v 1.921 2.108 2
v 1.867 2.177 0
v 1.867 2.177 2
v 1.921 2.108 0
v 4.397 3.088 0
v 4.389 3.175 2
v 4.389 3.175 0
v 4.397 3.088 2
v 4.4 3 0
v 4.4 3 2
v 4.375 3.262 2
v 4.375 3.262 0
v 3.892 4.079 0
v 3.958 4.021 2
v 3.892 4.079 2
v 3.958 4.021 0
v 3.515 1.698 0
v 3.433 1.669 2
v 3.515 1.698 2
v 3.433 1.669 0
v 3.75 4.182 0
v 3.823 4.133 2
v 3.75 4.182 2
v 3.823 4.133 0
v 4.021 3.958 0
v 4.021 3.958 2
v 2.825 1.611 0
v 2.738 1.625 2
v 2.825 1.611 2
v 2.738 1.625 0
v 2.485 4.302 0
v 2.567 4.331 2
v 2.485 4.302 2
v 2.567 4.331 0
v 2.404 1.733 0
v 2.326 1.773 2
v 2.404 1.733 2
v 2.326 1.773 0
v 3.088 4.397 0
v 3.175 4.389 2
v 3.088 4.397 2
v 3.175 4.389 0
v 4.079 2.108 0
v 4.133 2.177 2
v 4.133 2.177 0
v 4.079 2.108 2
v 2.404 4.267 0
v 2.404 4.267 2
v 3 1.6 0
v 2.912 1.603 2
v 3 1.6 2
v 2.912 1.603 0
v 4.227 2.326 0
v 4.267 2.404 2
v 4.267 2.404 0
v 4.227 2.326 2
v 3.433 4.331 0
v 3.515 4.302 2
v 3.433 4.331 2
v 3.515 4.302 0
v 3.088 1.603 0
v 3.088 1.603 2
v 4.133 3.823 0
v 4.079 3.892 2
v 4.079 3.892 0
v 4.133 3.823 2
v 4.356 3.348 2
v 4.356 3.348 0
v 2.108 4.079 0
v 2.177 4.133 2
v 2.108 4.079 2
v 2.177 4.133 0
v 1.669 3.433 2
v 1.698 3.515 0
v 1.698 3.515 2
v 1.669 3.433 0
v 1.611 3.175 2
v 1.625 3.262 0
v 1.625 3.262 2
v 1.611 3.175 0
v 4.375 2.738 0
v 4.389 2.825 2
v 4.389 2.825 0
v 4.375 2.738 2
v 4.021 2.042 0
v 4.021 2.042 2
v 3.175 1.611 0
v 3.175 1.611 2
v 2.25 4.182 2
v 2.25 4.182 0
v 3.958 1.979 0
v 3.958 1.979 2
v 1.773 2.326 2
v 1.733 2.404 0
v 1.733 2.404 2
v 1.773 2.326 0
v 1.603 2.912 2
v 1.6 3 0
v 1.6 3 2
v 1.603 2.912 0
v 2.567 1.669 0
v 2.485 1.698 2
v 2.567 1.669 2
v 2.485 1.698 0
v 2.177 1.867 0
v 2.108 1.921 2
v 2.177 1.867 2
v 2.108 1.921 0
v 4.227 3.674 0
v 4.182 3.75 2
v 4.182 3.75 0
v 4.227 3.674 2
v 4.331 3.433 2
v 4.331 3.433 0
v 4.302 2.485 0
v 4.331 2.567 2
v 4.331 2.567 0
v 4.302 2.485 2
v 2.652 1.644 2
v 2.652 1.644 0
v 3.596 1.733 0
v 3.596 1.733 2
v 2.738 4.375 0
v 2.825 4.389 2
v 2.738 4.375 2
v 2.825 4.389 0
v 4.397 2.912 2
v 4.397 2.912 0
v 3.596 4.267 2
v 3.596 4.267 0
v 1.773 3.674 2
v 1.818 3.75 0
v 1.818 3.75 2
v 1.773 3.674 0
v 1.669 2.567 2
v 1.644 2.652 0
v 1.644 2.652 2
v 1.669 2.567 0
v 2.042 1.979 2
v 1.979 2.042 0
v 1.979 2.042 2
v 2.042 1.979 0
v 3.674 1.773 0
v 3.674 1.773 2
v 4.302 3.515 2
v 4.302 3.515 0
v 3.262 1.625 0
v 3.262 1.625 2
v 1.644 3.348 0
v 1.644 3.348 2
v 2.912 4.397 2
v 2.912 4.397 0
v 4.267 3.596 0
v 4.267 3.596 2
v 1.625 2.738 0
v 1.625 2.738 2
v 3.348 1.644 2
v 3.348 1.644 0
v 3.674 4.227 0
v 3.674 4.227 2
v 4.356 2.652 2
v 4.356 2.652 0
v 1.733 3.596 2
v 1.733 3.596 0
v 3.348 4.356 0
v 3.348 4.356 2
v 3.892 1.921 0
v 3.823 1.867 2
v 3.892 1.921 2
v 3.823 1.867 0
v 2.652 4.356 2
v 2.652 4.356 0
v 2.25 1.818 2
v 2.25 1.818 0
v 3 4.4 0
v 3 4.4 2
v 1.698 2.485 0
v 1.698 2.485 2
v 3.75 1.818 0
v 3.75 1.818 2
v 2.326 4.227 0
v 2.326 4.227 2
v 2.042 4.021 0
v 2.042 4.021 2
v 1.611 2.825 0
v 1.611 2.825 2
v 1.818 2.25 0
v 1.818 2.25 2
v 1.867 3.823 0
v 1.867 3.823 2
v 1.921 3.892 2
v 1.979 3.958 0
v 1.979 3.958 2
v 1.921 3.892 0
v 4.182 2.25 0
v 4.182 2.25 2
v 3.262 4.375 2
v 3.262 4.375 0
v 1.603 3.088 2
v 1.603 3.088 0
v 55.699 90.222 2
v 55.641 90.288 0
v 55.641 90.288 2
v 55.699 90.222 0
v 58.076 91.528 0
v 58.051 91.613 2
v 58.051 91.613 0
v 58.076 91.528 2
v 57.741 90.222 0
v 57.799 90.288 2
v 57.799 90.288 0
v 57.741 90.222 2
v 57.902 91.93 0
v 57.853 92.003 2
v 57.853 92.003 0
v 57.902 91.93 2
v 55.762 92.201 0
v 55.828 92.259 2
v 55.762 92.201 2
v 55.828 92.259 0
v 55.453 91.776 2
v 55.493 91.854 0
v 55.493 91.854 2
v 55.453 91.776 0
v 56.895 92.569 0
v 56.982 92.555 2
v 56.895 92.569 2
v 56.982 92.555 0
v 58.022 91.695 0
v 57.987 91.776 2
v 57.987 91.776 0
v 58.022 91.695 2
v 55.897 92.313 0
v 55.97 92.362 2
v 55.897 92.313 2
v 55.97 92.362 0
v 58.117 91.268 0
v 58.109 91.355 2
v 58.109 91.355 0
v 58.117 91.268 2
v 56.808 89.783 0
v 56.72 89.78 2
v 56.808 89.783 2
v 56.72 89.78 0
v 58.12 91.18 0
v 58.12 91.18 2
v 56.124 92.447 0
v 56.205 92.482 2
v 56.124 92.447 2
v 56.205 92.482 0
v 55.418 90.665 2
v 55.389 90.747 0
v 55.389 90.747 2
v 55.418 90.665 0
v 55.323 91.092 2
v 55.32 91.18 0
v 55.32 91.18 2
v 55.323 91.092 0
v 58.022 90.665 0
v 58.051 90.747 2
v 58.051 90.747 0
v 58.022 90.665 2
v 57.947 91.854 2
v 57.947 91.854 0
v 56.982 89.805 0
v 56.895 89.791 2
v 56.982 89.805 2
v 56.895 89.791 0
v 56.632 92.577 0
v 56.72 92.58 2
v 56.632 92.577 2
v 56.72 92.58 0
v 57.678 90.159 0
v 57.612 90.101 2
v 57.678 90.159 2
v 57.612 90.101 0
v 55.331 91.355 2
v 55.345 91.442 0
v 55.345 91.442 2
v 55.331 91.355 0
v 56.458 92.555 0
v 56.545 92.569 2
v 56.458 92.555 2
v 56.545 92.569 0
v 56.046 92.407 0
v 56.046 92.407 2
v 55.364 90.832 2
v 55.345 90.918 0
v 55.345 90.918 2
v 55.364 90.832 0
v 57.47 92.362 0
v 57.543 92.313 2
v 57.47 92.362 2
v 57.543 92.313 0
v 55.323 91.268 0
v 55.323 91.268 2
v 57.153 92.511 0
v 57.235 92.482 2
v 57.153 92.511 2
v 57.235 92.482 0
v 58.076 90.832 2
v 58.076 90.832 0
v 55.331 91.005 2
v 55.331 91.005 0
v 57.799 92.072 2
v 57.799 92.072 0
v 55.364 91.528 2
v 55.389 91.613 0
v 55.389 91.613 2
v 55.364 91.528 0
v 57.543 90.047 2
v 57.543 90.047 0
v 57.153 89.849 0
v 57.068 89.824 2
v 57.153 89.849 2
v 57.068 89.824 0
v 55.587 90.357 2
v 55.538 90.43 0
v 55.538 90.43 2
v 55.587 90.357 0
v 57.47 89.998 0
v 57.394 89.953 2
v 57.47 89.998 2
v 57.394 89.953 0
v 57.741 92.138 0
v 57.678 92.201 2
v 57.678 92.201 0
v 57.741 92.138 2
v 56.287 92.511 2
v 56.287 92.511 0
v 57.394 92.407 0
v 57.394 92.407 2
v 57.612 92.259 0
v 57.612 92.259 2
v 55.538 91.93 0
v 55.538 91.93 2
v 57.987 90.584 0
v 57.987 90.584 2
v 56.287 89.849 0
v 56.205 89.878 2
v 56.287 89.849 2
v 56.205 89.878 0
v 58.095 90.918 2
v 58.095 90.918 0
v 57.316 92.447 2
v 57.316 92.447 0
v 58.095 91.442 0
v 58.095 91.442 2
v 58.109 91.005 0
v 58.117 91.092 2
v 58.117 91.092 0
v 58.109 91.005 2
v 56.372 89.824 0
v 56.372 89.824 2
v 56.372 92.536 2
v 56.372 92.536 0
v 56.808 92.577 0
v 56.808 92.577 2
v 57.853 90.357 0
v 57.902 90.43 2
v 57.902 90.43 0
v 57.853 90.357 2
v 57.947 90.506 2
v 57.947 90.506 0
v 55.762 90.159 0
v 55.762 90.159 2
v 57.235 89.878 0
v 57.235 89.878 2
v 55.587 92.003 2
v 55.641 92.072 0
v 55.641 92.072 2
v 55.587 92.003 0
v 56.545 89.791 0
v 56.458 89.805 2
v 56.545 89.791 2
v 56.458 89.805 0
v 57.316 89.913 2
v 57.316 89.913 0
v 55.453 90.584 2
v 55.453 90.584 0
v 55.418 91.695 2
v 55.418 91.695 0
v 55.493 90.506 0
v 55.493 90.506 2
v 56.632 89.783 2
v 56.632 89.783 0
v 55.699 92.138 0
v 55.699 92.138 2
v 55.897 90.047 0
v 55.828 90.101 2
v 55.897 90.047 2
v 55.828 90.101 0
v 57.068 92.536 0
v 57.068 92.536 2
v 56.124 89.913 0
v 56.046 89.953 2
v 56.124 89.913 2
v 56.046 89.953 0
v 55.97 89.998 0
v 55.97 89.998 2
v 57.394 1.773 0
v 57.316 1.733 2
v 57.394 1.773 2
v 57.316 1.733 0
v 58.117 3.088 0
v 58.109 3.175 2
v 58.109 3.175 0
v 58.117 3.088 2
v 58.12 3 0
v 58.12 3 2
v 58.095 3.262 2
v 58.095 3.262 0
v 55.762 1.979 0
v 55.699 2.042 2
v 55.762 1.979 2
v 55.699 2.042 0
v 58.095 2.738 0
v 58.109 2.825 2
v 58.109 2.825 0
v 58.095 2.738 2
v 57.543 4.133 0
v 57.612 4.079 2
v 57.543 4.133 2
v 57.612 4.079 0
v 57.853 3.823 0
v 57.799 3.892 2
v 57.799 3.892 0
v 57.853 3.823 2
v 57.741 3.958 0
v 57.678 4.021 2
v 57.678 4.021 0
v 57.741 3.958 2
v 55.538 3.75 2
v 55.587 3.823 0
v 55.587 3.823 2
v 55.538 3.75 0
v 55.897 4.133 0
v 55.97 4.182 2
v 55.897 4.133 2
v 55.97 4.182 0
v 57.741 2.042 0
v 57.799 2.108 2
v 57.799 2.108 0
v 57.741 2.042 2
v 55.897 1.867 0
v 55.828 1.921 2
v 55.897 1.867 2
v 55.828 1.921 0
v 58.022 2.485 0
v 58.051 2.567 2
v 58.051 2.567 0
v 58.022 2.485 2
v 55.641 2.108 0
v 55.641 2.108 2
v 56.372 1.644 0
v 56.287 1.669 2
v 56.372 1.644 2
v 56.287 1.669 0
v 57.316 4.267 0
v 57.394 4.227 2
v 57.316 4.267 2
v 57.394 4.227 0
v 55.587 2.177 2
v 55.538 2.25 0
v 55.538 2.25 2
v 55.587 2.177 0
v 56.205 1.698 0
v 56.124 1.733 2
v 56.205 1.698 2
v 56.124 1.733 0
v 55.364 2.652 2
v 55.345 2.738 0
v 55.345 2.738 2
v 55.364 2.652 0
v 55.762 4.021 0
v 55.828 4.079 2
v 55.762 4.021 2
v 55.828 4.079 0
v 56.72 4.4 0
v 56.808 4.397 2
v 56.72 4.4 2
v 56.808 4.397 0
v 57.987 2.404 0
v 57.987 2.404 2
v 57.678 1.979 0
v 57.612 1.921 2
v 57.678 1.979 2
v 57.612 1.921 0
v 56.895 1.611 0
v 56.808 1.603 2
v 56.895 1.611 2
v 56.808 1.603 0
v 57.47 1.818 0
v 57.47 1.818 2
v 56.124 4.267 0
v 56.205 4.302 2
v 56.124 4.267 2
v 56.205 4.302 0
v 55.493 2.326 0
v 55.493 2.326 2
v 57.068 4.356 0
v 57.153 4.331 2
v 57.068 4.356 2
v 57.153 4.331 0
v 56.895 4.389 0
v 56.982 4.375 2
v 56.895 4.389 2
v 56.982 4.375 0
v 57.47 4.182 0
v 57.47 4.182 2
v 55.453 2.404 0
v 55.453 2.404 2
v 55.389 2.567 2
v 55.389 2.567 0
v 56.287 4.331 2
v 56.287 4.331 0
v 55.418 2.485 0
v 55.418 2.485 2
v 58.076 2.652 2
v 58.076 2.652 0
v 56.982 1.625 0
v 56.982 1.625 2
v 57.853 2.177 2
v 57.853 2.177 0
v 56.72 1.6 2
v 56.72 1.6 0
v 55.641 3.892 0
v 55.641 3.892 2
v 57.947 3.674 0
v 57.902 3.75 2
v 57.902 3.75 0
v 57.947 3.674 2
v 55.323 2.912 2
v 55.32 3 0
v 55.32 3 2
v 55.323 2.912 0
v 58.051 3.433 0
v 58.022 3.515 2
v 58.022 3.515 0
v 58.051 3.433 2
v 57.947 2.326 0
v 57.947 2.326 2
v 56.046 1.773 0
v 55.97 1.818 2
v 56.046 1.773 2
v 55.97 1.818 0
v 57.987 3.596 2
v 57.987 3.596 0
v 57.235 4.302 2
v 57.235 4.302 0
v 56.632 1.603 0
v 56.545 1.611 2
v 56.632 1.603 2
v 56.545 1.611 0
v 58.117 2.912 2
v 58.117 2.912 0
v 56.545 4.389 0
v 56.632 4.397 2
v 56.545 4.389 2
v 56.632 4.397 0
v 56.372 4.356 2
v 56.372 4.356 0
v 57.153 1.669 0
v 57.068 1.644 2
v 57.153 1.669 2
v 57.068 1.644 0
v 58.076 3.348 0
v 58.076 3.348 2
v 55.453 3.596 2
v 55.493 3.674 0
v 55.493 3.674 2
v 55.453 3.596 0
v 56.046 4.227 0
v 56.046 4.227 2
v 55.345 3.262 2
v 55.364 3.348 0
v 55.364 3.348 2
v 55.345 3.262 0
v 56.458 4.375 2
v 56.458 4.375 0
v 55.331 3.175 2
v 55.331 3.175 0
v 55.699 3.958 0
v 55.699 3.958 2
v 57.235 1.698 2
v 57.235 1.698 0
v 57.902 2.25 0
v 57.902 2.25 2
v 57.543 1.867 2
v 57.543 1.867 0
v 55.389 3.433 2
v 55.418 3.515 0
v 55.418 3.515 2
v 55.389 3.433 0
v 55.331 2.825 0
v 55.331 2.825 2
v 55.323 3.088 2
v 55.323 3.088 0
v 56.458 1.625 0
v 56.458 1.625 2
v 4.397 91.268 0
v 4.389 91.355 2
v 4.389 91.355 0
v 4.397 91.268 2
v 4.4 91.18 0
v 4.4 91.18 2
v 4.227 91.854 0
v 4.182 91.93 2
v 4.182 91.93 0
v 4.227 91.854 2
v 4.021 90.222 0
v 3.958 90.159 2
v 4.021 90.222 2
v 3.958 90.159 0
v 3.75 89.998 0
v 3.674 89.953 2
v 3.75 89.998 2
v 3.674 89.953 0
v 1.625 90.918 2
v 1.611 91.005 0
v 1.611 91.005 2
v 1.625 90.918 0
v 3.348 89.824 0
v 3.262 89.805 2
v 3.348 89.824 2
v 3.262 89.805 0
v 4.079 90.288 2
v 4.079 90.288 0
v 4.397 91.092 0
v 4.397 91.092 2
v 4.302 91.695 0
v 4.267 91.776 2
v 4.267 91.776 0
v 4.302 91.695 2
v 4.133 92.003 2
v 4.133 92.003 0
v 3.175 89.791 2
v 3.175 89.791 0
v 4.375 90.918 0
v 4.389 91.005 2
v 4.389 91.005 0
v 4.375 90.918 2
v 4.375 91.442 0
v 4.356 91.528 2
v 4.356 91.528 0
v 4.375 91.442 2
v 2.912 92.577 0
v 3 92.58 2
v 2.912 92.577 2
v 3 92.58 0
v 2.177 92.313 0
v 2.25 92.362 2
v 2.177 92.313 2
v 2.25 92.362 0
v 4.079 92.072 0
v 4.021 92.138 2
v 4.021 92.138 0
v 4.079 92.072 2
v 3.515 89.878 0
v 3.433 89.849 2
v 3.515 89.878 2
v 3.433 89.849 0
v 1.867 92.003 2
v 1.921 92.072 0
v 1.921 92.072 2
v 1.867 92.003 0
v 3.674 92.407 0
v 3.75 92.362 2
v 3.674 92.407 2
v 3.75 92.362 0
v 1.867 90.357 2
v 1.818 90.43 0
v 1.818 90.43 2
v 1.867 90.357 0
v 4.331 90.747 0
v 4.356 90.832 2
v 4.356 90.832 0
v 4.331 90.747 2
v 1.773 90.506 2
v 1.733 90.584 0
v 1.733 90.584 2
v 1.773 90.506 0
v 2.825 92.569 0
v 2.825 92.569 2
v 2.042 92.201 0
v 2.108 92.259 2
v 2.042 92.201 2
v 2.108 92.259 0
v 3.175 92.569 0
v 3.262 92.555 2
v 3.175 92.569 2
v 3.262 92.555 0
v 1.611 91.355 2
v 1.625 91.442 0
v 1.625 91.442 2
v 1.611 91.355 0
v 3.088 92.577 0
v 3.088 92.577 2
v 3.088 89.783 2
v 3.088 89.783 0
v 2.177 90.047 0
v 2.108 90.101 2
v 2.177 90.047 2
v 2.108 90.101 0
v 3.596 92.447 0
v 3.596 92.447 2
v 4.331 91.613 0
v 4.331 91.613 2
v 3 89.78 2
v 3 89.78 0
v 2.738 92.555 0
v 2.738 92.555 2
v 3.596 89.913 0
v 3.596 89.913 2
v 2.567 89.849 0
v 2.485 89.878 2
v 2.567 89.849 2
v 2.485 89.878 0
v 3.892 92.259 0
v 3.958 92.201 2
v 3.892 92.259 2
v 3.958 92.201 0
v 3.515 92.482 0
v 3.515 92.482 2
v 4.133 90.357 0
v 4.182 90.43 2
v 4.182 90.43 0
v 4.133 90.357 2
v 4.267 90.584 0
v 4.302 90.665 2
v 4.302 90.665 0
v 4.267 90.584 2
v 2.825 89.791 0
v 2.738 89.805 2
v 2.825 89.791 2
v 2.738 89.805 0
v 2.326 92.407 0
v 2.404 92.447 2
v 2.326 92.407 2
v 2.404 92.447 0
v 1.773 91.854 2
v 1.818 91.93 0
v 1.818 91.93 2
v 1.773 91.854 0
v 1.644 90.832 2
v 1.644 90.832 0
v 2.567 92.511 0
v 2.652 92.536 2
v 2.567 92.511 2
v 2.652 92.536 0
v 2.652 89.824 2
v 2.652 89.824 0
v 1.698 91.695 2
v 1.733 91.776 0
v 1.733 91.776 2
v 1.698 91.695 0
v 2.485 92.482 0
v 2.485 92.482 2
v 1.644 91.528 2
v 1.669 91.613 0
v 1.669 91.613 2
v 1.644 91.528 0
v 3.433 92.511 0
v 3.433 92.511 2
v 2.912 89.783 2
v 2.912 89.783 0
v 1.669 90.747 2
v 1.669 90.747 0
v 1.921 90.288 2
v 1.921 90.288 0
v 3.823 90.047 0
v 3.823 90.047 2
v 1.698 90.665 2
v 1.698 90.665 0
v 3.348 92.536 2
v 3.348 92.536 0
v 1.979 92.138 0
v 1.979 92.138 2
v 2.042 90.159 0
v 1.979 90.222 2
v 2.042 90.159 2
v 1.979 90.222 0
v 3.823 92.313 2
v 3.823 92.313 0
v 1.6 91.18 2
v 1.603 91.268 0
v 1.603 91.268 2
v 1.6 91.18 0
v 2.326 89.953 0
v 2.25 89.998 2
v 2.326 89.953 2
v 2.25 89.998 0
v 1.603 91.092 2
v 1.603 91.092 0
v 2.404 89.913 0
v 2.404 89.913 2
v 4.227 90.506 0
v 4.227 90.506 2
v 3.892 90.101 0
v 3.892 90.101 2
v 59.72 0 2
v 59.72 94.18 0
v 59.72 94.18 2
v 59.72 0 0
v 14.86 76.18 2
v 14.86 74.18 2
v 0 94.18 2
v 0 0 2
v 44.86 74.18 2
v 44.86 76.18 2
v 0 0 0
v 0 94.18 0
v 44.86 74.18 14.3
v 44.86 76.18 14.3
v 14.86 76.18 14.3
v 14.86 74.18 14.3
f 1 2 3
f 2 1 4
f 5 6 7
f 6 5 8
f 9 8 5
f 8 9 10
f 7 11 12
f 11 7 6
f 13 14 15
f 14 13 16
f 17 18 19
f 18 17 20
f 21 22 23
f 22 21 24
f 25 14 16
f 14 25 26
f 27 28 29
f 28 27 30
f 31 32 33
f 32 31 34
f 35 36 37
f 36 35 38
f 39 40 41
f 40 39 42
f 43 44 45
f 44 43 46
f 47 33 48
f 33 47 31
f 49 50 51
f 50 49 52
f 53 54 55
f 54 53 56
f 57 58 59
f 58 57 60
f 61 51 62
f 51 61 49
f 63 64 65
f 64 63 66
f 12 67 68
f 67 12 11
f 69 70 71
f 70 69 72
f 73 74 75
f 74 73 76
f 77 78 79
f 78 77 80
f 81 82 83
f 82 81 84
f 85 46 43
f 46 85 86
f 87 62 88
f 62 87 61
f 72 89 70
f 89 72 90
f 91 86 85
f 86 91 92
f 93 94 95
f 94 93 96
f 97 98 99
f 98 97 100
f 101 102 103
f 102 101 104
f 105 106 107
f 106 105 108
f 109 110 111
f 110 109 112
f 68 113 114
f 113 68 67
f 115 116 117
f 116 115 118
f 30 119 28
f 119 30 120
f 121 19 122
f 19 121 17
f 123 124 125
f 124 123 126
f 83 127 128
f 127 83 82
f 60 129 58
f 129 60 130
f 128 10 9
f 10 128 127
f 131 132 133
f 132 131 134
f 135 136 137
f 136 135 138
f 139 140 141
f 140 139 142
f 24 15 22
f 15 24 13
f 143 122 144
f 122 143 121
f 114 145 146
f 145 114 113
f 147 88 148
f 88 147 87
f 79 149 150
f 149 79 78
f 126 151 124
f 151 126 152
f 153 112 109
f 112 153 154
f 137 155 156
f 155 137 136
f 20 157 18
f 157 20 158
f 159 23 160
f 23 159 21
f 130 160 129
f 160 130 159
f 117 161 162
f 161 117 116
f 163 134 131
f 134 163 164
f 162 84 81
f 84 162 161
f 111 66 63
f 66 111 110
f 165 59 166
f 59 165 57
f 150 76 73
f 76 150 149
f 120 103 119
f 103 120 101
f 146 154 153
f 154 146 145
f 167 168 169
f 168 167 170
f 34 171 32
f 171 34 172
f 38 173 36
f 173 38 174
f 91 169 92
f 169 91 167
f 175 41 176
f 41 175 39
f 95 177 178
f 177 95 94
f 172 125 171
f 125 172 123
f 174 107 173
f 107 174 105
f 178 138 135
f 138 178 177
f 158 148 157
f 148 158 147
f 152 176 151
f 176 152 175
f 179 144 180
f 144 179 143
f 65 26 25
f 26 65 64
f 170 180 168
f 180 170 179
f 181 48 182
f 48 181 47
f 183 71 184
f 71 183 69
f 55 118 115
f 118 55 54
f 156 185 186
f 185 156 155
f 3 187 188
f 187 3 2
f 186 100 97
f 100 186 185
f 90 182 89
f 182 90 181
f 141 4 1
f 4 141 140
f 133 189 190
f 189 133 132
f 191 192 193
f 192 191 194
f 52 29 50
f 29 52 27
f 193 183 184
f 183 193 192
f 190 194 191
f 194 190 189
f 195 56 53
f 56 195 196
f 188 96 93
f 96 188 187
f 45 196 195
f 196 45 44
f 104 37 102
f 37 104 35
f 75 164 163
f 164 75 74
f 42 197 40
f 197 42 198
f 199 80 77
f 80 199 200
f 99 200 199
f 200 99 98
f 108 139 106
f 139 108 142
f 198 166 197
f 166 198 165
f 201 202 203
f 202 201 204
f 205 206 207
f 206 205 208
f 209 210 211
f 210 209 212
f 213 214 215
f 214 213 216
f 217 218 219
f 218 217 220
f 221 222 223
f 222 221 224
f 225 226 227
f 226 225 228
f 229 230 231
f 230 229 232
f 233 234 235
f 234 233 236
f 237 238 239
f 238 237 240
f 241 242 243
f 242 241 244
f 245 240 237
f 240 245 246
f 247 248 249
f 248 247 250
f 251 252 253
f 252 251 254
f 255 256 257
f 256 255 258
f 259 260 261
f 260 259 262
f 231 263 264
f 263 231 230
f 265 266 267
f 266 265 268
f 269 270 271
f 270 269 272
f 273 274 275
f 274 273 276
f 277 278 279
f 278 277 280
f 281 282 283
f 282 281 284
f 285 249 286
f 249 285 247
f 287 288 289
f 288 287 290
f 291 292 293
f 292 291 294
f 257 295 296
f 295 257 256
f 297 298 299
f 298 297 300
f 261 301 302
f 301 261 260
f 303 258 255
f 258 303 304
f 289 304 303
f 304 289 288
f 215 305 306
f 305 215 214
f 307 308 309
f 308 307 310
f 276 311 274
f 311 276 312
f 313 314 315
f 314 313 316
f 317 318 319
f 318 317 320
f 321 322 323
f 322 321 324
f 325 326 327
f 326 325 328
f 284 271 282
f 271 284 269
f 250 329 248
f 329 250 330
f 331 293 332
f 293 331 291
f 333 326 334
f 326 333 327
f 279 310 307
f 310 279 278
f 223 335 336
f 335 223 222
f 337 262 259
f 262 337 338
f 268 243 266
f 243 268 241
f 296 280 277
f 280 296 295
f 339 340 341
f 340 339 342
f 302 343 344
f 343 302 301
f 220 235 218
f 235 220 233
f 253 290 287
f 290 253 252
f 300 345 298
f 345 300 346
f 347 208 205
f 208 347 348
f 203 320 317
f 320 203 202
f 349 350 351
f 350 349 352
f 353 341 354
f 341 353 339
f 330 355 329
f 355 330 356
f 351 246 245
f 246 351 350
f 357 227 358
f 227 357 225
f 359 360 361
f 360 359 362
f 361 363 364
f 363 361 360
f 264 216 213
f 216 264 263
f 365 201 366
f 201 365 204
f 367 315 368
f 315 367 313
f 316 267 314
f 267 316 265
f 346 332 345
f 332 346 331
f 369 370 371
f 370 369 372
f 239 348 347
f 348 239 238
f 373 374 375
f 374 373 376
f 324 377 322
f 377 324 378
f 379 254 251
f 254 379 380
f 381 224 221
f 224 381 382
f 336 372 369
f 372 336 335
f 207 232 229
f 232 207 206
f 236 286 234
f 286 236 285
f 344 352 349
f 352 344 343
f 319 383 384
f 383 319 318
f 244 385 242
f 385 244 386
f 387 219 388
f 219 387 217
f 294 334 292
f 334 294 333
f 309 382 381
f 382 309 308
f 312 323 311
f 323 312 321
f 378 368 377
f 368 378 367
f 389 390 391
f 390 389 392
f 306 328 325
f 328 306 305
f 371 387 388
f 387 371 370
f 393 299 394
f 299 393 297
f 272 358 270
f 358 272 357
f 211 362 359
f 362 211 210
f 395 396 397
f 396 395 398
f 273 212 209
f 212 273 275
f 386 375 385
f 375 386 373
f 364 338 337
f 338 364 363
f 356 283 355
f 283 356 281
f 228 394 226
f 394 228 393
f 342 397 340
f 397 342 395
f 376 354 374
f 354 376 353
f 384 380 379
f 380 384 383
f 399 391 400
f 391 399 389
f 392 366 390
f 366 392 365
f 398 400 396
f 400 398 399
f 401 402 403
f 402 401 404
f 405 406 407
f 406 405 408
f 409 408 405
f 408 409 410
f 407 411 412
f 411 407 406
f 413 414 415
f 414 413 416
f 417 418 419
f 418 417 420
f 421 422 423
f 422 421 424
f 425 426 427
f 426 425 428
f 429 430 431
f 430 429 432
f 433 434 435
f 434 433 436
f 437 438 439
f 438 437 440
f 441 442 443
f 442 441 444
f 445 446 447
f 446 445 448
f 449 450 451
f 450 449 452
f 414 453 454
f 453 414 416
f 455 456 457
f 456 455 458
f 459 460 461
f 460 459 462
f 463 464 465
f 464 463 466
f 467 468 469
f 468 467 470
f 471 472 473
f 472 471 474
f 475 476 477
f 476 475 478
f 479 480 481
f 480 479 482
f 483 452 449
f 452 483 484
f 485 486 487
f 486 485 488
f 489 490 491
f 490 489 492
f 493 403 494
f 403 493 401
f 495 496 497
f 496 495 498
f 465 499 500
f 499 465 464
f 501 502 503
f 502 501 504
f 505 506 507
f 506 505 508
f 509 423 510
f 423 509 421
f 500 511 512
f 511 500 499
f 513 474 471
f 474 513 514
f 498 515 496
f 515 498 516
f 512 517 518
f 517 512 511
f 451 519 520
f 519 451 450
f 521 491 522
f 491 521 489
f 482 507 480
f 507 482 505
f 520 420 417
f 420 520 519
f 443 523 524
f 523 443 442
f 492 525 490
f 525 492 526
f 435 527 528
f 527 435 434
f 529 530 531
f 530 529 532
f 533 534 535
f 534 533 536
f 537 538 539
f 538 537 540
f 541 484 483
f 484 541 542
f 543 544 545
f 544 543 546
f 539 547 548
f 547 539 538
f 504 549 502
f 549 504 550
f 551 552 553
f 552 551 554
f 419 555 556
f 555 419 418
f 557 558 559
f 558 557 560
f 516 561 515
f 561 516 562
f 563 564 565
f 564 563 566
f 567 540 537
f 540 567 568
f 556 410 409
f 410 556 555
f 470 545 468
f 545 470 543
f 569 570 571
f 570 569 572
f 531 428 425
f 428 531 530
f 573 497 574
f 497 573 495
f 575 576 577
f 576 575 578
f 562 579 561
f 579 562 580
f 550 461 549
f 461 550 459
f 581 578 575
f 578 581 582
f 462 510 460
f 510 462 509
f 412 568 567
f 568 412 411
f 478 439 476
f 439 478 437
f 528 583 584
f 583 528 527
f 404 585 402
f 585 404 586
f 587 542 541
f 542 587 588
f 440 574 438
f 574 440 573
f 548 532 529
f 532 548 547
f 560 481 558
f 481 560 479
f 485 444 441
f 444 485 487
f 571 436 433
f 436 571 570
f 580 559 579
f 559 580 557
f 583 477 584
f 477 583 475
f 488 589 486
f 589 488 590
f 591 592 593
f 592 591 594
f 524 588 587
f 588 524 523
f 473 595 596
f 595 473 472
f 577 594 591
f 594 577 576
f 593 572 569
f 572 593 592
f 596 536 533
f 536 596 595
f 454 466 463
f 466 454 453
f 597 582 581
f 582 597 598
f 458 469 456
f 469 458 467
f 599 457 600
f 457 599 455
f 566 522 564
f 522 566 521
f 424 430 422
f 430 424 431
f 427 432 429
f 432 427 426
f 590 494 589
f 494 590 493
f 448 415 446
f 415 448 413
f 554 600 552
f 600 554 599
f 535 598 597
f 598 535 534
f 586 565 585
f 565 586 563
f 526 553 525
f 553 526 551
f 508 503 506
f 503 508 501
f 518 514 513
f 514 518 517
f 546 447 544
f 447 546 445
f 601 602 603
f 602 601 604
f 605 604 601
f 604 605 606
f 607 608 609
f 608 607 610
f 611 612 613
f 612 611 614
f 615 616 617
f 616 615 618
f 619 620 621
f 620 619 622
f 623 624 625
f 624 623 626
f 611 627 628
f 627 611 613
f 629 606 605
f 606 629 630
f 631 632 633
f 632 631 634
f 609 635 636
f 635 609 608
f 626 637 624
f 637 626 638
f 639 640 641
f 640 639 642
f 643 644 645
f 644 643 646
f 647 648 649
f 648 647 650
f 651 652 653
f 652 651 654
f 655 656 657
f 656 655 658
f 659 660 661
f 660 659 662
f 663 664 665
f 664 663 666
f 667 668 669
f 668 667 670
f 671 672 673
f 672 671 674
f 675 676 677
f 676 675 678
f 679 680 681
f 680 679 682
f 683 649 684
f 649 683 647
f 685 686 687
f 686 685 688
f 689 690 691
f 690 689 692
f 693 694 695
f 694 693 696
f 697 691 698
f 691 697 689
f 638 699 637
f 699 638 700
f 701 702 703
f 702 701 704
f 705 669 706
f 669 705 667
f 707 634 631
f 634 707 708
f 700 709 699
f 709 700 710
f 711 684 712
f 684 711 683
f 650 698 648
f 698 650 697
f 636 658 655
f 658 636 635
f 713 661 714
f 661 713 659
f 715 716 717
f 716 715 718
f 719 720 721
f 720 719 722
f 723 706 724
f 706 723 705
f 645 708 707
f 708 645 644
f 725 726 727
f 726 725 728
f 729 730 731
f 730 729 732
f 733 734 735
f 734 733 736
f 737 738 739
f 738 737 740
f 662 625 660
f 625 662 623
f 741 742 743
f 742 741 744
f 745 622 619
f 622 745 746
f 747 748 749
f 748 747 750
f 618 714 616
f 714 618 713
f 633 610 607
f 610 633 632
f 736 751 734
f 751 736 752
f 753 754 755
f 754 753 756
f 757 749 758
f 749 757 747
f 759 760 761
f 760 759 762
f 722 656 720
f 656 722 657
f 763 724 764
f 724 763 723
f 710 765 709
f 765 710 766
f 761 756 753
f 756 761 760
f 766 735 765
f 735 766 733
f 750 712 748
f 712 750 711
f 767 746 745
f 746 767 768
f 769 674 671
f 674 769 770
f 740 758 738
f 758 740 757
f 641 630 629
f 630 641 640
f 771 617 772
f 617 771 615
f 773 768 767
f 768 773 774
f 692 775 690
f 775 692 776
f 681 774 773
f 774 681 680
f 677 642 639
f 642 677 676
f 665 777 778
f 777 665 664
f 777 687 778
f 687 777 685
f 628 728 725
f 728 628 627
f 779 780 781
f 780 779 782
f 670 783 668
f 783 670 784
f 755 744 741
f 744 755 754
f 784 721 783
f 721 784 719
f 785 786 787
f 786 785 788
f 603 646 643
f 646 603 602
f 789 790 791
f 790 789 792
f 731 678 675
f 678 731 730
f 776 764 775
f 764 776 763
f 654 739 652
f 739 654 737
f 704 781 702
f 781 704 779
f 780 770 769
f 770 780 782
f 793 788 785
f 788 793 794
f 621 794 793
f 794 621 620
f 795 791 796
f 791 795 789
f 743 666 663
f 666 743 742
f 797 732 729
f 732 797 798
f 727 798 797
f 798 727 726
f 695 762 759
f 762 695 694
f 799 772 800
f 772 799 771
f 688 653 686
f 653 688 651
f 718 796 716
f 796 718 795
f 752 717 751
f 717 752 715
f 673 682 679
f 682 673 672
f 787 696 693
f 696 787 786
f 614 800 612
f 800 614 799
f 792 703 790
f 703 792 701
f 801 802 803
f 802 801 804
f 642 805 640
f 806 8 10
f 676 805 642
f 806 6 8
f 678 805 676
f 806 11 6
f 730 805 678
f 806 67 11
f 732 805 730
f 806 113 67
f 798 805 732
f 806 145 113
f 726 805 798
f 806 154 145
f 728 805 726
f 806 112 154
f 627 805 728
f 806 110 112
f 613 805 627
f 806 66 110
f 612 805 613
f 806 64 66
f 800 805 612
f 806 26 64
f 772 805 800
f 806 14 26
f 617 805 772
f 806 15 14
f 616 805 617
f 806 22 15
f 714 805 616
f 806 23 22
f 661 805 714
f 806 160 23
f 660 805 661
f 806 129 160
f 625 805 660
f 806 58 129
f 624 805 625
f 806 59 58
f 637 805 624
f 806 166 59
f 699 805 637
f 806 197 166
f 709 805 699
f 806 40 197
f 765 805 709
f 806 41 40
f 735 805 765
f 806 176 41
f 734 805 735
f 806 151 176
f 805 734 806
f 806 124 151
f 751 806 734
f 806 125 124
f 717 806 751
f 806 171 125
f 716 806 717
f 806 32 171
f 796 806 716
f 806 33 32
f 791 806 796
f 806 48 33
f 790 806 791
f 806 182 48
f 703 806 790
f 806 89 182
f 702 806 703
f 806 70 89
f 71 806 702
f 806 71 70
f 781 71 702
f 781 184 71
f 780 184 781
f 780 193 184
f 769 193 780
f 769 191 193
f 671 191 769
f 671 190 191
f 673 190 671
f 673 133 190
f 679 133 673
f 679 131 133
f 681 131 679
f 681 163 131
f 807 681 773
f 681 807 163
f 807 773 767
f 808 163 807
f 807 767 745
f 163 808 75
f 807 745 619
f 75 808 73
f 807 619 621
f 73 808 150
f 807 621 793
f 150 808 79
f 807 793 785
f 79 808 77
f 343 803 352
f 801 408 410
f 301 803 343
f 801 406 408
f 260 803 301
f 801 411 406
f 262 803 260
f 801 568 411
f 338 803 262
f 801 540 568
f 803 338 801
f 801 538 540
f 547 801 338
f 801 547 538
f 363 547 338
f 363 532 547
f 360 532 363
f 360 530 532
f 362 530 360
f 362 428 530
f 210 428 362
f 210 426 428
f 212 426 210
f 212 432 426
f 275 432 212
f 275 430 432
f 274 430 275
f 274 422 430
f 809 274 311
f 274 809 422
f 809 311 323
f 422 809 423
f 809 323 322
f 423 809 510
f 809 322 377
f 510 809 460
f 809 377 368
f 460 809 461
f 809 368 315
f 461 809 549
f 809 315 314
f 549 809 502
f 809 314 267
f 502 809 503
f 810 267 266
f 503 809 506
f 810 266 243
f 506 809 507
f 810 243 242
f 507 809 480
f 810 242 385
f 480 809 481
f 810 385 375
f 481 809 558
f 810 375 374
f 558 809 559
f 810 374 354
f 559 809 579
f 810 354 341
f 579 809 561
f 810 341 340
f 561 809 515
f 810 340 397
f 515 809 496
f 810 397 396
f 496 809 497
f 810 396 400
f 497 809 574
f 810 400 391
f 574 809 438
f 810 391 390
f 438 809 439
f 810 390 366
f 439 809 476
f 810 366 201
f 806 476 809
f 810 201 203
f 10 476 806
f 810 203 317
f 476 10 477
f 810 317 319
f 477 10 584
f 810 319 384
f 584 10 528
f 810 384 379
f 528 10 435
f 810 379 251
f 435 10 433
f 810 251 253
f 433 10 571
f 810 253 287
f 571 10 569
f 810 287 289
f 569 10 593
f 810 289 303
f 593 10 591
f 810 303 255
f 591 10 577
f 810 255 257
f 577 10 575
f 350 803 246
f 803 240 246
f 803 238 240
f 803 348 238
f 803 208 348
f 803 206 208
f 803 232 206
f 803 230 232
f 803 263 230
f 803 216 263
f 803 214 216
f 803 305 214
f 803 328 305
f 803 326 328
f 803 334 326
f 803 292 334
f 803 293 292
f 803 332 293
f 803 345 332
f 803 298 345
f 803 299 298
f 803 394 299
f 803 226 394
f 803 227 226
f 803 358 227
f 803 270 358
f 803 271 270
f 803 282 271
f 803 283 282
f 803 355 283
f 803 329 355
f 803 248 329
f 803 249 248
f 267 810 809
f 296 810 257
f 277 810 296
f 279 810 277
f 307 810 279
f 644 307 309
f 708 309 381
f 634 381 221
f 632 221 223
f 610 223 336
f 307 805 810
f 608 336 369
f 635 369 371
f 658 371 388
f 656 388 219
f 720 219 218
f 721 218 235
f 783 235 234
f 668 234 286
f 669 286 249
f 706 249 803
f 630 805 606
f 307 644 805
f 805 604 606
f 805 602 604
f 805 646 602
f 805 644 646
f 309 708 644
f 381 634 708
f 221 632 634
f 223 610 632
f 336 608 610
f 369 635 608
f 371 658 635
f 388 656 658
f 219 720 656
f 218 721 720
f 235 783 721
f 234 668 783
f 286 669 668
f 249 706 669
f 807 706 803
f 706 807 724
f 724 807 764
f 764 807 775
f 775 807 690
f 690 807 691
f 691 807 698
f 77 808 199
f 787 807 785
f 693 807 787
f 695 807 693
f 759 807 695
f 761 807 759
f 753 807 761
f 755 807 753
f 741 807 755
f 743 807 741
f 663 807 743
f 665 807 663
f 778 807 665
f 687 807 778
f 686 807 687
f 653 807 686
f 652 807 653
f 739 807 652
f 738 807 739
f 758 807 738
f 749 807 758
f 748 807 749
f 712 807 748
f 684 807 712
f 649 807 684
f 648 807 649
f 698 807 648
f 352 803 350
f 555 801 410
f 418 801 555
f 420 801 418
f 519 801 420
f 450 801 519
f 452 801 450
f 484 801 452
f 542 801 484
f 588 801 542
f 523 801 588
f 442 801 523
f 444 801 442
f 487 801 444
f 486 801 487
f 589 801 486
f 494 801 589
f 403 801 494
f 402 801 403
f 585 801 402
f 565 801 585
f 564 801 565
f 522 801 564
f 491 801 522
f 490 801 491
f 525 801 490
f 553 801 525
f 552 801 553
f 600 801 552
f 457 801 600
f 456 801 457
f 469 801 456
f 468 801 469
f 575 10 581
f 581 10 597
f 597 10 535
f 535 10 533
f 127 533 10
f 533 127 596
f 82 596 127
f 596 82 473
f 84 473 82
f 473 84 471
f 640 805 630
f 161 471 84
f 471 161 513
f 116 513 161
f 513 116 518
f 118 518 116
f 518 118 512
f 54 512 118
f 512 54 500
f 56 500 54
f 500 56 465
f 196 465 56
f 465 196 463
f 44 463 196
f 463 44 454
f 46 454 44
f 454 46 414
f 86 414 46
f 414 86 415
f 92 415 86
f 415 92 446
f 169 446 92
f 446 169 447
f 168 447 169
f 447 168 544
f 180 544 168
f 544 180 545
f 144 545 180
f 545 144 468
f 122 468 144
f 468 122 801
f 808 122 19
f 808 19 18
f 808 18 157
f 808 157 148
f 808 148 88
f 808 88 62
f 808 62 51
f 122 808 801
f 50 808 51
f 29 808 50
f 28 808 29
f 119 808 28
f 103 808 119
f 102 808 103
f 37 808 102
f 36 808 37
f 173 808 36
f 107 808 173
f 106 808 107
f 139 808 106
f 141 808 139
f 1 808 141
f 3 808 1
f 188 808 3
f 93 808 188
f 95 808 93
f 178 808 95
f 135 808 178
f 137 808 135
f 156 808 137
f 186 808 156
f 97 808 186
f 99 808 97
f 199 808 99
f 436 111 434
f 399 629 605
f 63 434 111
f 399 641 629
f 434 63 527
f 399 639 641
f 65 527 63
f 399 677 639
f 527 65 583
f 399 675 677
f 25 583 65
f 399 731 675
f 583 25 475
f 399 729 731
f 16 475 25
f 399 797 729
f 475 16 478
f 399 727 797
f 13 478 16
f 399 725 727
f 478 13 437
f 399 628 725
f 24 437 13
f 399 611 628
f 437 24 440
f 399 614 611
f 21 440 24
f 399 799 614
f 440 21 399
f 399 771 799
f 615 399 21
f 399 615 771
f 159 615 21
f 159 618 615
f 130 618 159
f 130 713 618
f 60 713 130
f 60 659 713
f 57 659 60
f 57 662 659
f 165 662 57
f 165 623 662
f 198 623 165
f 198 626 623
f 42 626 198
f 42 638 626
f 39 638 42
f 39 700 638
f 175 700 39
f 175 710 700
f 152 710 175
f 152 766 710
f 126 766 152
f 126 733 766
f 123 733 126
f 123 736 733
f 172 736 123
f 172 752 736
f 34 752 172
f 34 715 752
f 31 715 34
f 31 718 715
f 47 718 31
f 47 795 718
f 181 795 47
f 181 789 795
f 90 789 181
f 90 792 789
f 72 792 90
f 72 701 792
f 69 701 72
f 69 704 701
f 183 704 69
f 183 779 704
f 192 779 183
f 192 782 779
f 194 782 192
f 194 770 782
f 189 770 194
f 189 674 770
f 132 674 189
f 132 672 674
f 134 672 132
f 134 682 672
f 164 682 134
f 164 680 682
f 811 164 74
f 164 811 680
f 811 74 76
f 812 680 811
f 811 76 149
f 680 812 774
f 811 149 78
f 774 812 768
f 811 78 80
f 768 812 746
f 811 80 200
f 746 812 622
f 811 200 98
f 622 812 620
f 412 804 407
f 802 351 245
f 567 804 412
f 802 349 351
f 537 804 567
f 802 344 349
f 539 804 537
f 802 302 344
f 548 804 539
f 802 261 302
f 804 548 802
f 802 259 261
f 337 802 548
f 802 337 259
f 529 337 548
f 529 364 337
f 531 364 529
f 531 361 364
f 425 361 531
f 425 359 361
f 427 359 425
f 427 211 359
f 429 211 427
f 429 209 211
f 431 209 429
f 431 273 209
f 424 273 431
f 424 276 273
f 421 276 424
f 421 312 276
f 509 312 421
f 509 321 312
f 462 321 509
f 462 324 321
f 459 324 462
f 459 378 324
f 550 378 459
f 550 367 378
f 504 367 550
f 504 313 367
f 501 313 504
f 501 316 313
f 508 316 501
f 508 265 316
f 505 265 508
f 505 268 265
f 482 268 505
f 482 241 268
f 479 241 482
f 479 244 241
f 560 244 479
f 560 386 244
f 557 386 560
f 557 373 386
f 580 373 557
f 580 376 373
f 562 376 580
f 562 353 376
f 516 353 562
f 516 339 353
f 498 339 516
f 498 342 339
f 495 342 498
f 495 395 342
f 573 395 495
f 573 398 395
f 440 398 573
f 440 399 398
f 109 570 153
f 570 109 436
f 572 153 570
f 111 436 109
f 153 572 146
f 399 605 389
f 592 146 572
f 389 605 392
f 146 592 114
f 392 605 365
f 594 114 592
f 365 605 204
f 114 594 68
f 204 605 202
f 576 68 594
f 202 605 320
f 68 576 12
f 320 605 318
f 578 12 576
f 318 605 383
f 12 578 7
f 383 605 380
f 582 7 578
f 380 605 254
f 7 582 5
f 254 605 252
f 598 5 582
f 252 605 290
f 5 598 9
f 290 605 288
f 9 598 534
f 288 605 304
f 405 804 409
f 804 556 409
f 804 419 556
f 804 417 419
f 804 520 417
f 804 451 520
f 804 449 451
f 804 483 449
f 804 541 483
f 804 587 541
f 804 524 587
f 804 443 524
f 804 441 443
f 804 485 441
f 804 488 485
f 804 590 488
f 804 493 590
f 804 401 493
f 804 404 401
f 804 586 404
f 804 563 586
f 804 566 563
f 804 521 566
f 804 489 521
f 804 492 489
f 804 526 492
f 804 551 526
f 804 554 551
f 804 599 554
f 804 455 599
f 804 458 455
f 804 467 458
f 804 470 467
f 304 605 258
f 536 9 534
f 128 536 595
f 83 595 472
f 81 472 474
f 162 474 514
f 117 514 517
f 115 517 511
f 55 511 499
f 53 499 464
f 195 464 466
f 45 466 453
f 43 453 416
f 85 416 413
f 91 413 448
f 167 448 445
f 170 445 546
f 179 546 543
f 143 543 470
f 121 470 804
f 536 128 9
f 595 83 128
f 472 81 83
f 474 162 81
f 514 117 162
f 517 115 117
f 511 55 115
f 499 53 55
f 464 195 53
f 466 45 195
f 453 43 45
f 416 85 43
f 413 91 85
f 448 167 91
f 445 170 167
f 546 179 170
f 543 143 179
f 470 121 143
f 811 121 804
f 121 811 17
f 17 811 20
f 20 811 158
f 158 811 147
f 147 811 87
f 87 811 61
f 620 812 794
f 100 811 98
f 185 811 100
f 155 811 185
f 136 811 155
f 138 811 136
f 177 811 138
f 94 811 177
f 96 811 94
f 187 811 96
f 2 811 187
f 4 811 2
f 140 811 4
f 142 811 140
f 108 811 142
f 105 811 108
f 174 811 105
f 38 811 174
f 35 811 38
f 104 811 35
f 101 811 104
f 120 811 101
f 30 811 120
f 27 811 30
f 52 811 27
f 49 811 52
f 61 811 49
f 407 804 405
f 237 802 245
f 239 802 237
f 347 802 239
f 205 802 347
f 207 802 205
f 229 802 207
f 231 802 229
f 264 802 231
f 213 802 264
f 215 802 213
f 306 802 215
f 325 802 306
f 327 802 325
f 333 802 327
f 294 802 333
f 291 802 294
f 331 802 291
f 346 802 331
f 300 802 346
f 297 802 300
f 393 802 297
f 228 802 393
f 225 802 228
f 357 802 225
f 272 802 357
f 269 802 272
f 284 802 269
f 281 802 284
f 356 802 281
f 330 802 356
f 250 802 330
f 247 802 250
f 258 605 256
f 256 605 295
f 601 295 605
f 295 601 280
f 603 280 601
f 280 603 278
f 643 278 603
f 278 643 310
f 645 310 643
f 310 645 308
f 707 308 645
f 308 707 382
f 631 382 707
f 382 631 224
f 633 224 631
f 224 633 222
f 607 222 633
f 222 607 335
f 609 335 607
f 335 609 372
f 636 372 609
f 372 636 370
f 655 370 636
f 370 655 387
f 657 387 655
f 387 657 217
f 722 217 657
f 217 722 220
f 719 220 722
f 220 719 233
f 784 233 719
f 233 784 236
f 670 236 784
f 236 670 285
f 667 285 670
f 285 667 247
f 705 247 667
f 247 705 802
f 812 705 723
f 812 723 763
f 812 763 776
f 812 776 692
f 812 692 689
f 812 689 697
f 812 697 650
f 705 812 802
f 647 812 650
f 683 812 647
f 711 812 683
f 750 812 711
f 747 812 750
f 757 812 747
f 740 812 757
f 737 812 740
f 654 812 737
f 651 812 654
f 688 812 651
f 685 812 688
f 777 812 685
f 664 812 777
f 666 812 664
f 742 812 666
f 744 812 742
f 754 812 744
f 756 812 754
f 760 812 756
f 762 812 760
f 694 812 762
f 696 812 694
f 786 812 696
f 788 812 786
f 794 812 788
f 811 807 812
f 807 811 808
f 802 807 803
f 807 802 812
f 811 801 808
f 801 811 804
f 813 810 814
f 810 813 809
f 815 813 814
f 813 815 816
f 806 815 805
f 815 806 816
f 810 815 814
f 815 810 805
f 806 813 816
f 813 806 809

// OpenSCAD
$fn = 100;
pcbWidth = 42.72;
pcbLength = 77.18;

displayBorderX = 1.86;
displayBorderY = 16.2;
displayLength = 53;
spacing = 6;
wall = 2.5;
lidWall = 2;
rimHeight = 3;
holeRadius = 3.2 / 2 - 0.5;
bottomLeftX = 3;
bottomLeftY = 6.92;
bottomRightX = pcbWidth - bottomLeftX;
bottomRightY = bottomLeftY;
topLeftX = 3;
topLeftY = pcbLength - 3;
topRightX = pcbWidth - bottomLeftX;
topRightY = pcbLength - 3;
poleHeight = wall + 5.6;

boxWidth = 2 * (spacing + wall) + pcbWidth;
boxLength = 2 * (spacing + wall) + pcbLength;
boxHeight = 20;

screwHoleRadius = 1.5;
lidHoleRadius = 1.4;
screwHolePoleRadius = 3;
screwHoleHeight = 5;
lidPusherWidth = 30;
lidPusherLength = 2;
lidPusherHeight = 12.3;
lidPusherOffsetY = 20;

connectorHoleX =  pcbWidth + 10;
connectorHoleY = 14 + spacing + wall;
connectorHoleZ = 7 + wall;

module bottomCase() {
    difference() {
        cube([boxWidth, boxLength, boxHeight]);
        translate([wall, wall, wall])
            cube([boxWidth - 2 * wall, boxLength - 2 * wall, boxHeight]);
    }
};
module poles() {
    pcbOffset = wall + spacing;
   
    translate([pcbOffset + bottomLeftX, pcbOffset + bottomLeftY, 0])
        cylinder(r=holeRadius, h = poleHeight);
    translate([pcbOffset + bottomRightX, pcbOffset + bottomRightY, 0])
        cylinder(r=holeRadius, h = poleHeight);
    translate([pcbOffset + topLeftX, pcbOffset + topLeftY, 0])
        cylinder(r=holeRadius, h = poleHeight);
    translate([pcbOffset + topRightX, pcbOffset + topRightY, 0])
        cylinder(r=holeRadius, h = poleHeight);
}
module screwHoles() {
    difference() {
        union() {
            translate([screwHolePoleRadius, screwHolePoleRadius, rimHeight])
                cylinder(r = screwHolePoleRadius, h = boxHeight - rimHeight);
            translate([boxWidth - screwHolePoleRadius, boxLength - screwHolePoleRadius, rimHeight])
                cylinder(r = screwHolePoleRadius, h = boxHeight - rimHeight);
            translate([screwHolePoleRadius, boxLength - screwHolePoleRadius, rimHeight])
                cylinder(r = screwHolePoleRadius, h = boxHeight - rimHeight);
            translate([boxWidth - screwHolePoleRadius, screwHolePoleRadius, rimHeight])
                cylinder(r = screwHolePoleRadius, h = boxHeight - rimHeight);
        }
        union() {
            translate([screwHolePoleRadius, screwHolePoleRadius, boxHeight - screwHoleHeight])
                cylinder(r = screwHoleRadius, h = 5);
            translate([boxWidth - screwHolePoleRadius, boxLength - screwHolePoleRadius, boxHeight - screwHoleHeight])
                cylinder(r = screwHoleRadius, h = 5);
            translate([screwHolePoleRadius, boxLength - screwHolePoleRadius, boxHeight - screwHoleHeight])
                cylinder(r = screwHoleRadius, h = 5);
            translate([boxWidth - screwHolePoleRadius, screwHolePoleRadius, boxHeight - screwHoleHeight])
                cylinder(r = screwHoleRadius, h = 5);

        }
    }
}
module connectorHole() {
    translate([connectorHoleX, connectorHoleY, connectorHoleZ])
        cube([10, 15, 20]);
}
module case() {
    difference() {
        union() {
            bottomCase();

        }
        union() {
            //translate([wall + spacing + displayBorderX, wall + spacing + displayBorderY, -5])
            //    cube([pcbWidth - 2 * displayBorderX, displayLength, 30]);
            cutAways();
            connectorHole();
        }
    }
}
module lid() {
    translate([(boxWidth - lidPusherWidth) / 2, boxLength - lidPusherOffsetY, lidWall])
    cube([lidPusherWidth, lidPusherLength, lidPusherHeight]);
    difference() {
       cube([boxWidth, boxLength, lidWall]); 

       union() {
            translate([screwHolePoleRadius, screwHolePoleRadius, -2])
             cylinder(r = lidHoleRadius, h = 5);
            translate([boxWidth - screwHolePoleRadius, boxLength - screwHolePoleRadius, -2])
             cylinder(r = lidHoleRadius, h = 5);  
            translate([boxWidth - screwHolePoleRadius, screwHolePoleRadius, -2])
             cylinder(r = lidHoleRadius, h = 5);  
            translate([screwHolePoleRadius, boxLength - screwHolePoleRadius, -2])
             cylinder(r = lidHoleRadius, h = 5); 
       }
    }
}
module cutAways() {
    increment = 2;

    hull() {
        translate([wall + spacing + displayBorderX, wall + spacing + displayBorderY, wall - 0.5])
                    cube([pcbWidth - 2 * displayBorderX, displayLength, 0.5]);
        translate([wall + spacing + displayBorderX - increment, wall + spacing + displayBorderY - increment, -0.5])
                    cube([pcbWidth - 2 * displayBorderX + 2*increment, displayLength + 2 * increment, 0.5]);
    };
    translate([0, 0, rimHeight]) 
        rotate([0, 150, 0])  
            cube([5, boxLength, 20]); 
    translate([0,0, rimHeight])
    rotate([210, 0, 0])  
        cube([boxWidth, 5, 20]);
    translate([boxWidth, 0, rimHeight])
        rotate([0, 210, 0])
            translate([-5, 0, 0])
            cube([5, boxLength, 20]); 
    translate([0, boxLength, rimHeight])
        rotate([150, 0, 0])
            translate([0, -5, 0])
            cube([boxWidth, 5, 20]); 
}
module allCase() {
  //cutAways();
    screwHoles();
    case();

    poles();  
}
//allCase();
lid();
